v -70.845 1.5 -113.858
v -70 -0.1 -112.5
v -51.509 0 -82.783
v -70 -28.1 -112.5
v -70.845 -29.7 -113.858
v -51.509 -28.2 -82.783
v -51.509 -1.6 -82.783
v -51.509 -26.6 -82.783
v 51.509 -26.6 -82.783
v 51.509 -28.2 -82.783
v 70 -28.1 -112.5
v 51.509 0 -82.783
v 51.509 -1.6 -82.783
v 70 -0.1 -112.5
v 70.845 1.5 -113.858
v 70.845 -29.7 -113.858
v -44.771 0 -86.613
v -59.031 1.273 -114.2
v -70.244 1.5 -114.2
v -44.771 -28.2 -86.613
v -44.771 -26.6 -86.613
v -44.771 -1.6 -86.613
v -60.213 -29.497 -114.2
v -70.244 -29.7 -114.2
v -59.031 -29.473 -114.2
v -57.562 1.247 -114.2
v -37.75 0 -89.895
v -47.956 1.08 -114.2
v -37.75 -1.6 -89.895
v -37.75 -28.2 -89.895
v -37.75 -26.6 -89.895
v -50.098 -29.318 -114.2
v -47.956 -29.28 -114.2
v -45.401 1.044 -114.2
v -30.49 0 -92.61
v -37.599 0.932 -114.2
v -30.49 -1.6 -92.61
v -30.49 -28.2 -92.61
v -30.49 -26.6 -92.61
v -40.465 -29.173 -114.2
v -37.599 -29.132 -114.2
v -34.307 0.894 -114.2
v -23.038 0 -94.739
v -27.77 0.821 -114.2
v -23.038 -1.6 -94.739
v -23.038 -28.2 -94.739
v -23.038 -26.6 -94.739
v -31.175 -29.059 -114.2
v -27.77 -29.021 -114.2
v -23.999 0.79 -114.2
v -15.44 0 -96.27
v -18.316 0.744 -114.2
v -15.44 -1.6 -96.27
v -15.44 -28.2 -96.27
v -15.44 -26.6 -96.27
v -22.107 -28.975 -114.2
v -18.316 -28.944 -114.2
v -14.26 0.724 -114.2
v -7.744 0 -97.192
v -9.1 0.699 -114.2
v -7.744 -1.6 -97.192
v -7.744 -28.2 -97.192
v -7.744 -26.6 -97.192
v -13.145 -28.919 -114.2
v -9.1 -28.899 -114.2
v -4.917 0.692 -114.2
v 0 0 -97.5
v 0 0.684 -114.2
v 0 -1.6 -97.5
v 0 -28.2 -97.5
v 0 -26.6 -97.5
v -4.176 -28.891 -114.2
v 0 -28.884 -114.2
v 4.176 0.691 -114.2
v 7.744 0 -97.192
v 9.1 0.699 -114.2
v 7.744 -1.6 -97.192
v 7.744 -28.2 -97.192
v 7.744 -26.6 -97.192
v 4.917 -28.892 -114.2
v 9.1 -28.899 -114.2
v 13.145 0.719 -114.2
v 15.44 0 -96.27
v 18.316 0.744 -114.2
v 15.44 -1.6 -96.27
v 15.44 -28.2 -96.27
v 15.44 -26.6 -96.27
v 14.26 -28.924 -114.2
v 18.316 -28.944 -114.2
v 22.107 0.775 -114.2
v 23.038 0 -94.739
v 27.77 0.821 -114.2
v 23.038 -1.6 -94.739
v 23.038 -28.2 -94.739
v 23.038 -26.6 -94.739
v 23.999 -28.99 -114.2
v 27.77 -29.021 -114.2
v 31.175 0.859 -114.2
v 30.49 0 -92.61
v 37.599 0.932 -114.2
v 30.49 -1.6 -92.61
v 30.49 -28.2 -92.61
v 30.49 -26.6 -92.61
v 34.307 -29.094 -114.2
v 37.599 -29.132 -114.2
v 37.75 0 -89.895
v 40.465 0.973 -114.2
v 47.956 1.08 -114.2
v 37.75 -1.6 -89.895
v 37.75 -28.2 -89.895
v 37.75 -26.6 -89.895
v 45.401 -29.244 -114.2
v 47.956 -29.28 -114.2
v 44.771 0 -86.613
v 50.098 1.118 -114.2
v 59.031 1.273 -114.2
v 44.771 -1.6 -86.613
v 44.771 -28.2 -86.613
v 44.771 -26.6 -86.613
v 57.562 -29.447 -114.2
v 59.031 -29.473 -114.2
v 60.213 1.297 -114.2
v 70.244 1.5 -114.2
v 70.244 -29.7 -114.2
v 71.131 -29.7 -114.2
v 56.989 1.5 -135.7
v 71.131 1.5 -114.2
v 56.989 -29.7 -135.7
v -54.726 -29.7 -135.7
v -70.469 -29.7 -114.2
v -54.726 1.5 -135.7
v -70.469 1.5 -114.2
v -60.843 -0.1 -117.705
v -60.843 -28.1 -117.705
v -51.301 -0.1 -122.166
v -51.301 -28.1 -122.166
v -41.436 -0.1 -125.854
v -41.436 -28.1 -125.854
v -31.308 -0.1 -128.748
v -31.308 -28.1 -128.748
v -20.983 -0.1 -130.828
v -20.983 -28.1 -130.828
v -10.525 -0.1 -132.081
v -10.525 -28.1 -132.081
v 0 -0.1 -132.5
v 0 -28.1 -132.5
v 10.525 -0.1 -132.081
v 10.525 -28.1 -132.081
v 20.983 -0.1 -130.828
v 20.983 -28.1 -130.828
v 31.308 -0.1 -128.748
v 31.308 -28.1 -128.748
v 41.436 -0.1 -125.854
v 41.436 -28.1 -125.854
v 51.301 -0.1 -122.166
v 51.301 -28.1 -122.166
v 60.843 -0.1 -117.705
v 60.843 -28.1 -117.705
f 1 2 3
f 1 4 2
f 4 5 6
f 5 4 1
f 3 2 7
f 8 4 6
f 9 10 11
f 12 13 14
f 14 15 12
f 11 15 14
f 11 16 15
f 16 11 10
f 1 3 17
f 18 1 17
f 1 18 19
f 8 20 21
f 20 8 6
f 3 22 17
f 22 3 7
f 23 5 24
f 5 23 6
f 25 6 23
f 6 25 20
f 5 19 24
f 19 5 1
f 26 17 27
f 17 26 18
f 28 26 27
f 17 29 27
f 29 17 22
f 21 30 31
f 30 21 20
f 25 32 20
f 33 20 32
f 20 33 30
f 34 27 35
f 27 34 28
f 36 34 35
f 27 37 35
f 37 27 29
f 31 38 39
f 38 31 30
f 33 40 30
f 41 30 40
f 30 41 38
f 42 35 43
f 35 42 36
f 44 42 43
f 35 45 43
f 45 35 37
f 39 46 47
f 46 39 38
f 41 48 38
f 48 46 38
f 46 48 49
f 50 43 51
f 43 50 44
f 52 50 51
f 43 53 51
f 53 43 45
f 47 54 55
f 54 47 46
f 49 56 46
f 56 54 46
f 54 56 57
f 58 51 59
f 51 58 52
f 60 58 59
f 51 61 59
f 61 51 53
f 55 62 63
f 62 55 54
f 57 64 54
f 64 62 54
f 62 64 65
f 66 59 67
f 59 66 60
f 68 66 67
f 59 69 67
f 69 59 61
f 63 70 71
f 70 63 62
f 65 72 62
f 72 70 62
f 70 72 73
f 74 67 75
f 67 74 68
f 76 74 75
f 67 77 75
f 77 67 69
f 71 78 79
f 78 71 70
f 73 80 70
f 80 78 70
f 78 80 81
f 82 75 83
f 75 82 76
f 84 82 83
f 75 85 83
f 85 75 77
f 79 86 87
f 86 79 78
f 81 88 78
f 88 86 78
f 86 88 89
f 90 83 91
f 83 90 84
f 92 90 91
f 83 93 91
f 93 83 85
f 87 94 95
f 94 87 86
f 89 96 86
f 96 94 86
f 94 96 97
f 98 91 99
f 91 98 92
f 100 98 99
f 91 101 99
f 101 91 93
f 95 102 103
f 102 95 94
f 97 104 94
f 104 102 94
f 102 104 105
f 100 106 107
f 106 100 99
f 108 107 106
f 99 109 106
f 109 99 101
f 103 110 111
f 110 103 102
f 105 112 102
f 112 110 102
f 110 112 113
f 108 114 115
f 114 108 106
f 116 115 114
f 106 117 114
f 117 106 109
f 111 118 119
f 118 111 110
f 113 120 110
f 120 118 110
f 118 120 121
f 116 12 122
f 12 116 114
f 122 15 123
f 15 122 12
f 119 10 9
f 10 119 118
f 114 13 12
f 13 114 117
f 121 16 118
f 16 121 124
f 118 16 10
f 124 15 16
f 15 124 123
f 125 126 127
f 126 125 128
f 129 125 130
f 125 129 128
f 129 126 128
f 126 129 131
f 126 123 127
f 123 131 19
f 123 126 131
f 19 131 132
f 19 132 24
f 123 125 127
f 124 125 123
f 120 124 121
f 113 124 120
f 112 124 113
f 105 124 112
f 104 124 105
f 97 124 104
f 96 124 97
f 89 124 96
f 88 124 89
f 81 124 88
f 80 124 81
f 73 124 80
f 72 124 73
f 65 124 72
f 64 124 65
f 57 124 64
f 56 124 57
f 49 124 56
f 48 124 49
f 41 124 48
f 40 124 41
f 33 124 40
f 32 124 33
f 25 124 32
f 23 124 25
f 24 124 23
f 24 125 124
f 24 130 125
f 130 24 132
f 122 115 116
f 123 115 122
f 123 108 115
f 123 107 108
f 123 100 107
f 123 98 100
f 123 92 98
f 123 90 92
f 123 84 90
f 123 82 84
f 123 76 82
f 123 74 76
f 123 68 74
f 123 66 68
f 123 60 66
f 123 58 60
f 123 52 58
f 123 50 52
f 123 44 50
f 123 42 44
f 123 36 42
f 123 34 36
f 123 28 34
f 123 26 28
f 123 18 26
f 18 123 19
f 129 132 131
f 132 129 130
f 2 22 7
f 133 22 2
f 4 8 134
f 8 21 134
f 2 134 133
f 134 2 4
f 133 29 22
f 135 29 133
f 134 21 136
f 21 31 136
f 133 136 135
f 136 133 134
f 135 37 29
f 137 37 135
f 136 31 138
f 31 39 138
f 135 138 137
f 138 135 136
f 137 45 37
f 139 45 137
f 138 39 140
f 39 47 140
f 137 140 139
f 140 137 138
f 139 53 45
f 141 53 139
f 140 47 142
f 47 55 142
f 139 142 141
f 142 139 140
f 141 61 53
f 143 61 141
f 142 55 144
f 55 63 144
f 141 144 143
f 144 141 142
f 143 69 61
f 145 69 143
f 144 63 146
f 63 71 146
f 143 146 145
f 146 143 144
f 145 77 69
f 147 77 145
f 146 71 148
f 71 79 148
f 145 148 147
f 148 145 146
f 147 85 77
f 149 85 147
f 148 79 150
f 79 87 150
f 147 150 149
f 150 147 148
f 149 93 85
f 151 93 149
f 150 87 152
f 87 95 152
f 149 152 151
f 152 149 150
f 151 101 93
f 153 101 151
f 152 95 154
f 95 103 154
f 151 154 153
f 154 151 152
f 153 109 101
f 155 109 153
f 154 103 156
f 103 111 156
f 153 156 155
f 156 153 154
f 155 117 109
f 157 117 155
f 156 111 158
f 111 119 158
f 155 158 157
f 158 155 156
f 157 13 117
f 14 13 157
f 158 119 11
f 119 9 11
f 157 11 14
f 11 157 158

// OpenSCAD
$fn=80;

wall=1.6;   // Wall thickness
length=140; // effective length
lower_width=28;  // distance between outer side of blades at blade
upper_width=25; // distance between outer side of blades at upper side of blade
height=20;  // distance from bottom to blade at end
blade_height=35;

r=pow(length,2)/8/height+height/2;

angle=2*asin(length/2/r);
echo(r);
echo(angle);

d_width=lower_width-upper_width;

rotate([90,90+angle/2,0])

difference() {

union() {
rotate_extrude(angle=angle) {
  translate([r-blade_height,0,0])
  polygon([[0,0],[0,upper_width+2*wall],[blade_height+wall,upper_width+2*wall+d_width/2],[blade_height+wall,-d_width/2]]);
};
   rotate(-90+angle/2)
    translate([-length/2-wall*sin(45),r-height+2*wall,-d_width/2])
    linear_extrude(lower_width+2*wall) {
        polygon([[0,-d_width/2],[length+wall,-d_width/2],[length-height*sin(45),height],[height*sin(45),height]]);
    
};
}

rotate_extrude(angle=angle) {
  translate([r-blade_height,0,0])
  polygon([[0,wall],[0,upper_width+wall],[blade_height,upper_width+wall+d_width/2],[blade_height,-d_width/2+wall]]);
};
}
